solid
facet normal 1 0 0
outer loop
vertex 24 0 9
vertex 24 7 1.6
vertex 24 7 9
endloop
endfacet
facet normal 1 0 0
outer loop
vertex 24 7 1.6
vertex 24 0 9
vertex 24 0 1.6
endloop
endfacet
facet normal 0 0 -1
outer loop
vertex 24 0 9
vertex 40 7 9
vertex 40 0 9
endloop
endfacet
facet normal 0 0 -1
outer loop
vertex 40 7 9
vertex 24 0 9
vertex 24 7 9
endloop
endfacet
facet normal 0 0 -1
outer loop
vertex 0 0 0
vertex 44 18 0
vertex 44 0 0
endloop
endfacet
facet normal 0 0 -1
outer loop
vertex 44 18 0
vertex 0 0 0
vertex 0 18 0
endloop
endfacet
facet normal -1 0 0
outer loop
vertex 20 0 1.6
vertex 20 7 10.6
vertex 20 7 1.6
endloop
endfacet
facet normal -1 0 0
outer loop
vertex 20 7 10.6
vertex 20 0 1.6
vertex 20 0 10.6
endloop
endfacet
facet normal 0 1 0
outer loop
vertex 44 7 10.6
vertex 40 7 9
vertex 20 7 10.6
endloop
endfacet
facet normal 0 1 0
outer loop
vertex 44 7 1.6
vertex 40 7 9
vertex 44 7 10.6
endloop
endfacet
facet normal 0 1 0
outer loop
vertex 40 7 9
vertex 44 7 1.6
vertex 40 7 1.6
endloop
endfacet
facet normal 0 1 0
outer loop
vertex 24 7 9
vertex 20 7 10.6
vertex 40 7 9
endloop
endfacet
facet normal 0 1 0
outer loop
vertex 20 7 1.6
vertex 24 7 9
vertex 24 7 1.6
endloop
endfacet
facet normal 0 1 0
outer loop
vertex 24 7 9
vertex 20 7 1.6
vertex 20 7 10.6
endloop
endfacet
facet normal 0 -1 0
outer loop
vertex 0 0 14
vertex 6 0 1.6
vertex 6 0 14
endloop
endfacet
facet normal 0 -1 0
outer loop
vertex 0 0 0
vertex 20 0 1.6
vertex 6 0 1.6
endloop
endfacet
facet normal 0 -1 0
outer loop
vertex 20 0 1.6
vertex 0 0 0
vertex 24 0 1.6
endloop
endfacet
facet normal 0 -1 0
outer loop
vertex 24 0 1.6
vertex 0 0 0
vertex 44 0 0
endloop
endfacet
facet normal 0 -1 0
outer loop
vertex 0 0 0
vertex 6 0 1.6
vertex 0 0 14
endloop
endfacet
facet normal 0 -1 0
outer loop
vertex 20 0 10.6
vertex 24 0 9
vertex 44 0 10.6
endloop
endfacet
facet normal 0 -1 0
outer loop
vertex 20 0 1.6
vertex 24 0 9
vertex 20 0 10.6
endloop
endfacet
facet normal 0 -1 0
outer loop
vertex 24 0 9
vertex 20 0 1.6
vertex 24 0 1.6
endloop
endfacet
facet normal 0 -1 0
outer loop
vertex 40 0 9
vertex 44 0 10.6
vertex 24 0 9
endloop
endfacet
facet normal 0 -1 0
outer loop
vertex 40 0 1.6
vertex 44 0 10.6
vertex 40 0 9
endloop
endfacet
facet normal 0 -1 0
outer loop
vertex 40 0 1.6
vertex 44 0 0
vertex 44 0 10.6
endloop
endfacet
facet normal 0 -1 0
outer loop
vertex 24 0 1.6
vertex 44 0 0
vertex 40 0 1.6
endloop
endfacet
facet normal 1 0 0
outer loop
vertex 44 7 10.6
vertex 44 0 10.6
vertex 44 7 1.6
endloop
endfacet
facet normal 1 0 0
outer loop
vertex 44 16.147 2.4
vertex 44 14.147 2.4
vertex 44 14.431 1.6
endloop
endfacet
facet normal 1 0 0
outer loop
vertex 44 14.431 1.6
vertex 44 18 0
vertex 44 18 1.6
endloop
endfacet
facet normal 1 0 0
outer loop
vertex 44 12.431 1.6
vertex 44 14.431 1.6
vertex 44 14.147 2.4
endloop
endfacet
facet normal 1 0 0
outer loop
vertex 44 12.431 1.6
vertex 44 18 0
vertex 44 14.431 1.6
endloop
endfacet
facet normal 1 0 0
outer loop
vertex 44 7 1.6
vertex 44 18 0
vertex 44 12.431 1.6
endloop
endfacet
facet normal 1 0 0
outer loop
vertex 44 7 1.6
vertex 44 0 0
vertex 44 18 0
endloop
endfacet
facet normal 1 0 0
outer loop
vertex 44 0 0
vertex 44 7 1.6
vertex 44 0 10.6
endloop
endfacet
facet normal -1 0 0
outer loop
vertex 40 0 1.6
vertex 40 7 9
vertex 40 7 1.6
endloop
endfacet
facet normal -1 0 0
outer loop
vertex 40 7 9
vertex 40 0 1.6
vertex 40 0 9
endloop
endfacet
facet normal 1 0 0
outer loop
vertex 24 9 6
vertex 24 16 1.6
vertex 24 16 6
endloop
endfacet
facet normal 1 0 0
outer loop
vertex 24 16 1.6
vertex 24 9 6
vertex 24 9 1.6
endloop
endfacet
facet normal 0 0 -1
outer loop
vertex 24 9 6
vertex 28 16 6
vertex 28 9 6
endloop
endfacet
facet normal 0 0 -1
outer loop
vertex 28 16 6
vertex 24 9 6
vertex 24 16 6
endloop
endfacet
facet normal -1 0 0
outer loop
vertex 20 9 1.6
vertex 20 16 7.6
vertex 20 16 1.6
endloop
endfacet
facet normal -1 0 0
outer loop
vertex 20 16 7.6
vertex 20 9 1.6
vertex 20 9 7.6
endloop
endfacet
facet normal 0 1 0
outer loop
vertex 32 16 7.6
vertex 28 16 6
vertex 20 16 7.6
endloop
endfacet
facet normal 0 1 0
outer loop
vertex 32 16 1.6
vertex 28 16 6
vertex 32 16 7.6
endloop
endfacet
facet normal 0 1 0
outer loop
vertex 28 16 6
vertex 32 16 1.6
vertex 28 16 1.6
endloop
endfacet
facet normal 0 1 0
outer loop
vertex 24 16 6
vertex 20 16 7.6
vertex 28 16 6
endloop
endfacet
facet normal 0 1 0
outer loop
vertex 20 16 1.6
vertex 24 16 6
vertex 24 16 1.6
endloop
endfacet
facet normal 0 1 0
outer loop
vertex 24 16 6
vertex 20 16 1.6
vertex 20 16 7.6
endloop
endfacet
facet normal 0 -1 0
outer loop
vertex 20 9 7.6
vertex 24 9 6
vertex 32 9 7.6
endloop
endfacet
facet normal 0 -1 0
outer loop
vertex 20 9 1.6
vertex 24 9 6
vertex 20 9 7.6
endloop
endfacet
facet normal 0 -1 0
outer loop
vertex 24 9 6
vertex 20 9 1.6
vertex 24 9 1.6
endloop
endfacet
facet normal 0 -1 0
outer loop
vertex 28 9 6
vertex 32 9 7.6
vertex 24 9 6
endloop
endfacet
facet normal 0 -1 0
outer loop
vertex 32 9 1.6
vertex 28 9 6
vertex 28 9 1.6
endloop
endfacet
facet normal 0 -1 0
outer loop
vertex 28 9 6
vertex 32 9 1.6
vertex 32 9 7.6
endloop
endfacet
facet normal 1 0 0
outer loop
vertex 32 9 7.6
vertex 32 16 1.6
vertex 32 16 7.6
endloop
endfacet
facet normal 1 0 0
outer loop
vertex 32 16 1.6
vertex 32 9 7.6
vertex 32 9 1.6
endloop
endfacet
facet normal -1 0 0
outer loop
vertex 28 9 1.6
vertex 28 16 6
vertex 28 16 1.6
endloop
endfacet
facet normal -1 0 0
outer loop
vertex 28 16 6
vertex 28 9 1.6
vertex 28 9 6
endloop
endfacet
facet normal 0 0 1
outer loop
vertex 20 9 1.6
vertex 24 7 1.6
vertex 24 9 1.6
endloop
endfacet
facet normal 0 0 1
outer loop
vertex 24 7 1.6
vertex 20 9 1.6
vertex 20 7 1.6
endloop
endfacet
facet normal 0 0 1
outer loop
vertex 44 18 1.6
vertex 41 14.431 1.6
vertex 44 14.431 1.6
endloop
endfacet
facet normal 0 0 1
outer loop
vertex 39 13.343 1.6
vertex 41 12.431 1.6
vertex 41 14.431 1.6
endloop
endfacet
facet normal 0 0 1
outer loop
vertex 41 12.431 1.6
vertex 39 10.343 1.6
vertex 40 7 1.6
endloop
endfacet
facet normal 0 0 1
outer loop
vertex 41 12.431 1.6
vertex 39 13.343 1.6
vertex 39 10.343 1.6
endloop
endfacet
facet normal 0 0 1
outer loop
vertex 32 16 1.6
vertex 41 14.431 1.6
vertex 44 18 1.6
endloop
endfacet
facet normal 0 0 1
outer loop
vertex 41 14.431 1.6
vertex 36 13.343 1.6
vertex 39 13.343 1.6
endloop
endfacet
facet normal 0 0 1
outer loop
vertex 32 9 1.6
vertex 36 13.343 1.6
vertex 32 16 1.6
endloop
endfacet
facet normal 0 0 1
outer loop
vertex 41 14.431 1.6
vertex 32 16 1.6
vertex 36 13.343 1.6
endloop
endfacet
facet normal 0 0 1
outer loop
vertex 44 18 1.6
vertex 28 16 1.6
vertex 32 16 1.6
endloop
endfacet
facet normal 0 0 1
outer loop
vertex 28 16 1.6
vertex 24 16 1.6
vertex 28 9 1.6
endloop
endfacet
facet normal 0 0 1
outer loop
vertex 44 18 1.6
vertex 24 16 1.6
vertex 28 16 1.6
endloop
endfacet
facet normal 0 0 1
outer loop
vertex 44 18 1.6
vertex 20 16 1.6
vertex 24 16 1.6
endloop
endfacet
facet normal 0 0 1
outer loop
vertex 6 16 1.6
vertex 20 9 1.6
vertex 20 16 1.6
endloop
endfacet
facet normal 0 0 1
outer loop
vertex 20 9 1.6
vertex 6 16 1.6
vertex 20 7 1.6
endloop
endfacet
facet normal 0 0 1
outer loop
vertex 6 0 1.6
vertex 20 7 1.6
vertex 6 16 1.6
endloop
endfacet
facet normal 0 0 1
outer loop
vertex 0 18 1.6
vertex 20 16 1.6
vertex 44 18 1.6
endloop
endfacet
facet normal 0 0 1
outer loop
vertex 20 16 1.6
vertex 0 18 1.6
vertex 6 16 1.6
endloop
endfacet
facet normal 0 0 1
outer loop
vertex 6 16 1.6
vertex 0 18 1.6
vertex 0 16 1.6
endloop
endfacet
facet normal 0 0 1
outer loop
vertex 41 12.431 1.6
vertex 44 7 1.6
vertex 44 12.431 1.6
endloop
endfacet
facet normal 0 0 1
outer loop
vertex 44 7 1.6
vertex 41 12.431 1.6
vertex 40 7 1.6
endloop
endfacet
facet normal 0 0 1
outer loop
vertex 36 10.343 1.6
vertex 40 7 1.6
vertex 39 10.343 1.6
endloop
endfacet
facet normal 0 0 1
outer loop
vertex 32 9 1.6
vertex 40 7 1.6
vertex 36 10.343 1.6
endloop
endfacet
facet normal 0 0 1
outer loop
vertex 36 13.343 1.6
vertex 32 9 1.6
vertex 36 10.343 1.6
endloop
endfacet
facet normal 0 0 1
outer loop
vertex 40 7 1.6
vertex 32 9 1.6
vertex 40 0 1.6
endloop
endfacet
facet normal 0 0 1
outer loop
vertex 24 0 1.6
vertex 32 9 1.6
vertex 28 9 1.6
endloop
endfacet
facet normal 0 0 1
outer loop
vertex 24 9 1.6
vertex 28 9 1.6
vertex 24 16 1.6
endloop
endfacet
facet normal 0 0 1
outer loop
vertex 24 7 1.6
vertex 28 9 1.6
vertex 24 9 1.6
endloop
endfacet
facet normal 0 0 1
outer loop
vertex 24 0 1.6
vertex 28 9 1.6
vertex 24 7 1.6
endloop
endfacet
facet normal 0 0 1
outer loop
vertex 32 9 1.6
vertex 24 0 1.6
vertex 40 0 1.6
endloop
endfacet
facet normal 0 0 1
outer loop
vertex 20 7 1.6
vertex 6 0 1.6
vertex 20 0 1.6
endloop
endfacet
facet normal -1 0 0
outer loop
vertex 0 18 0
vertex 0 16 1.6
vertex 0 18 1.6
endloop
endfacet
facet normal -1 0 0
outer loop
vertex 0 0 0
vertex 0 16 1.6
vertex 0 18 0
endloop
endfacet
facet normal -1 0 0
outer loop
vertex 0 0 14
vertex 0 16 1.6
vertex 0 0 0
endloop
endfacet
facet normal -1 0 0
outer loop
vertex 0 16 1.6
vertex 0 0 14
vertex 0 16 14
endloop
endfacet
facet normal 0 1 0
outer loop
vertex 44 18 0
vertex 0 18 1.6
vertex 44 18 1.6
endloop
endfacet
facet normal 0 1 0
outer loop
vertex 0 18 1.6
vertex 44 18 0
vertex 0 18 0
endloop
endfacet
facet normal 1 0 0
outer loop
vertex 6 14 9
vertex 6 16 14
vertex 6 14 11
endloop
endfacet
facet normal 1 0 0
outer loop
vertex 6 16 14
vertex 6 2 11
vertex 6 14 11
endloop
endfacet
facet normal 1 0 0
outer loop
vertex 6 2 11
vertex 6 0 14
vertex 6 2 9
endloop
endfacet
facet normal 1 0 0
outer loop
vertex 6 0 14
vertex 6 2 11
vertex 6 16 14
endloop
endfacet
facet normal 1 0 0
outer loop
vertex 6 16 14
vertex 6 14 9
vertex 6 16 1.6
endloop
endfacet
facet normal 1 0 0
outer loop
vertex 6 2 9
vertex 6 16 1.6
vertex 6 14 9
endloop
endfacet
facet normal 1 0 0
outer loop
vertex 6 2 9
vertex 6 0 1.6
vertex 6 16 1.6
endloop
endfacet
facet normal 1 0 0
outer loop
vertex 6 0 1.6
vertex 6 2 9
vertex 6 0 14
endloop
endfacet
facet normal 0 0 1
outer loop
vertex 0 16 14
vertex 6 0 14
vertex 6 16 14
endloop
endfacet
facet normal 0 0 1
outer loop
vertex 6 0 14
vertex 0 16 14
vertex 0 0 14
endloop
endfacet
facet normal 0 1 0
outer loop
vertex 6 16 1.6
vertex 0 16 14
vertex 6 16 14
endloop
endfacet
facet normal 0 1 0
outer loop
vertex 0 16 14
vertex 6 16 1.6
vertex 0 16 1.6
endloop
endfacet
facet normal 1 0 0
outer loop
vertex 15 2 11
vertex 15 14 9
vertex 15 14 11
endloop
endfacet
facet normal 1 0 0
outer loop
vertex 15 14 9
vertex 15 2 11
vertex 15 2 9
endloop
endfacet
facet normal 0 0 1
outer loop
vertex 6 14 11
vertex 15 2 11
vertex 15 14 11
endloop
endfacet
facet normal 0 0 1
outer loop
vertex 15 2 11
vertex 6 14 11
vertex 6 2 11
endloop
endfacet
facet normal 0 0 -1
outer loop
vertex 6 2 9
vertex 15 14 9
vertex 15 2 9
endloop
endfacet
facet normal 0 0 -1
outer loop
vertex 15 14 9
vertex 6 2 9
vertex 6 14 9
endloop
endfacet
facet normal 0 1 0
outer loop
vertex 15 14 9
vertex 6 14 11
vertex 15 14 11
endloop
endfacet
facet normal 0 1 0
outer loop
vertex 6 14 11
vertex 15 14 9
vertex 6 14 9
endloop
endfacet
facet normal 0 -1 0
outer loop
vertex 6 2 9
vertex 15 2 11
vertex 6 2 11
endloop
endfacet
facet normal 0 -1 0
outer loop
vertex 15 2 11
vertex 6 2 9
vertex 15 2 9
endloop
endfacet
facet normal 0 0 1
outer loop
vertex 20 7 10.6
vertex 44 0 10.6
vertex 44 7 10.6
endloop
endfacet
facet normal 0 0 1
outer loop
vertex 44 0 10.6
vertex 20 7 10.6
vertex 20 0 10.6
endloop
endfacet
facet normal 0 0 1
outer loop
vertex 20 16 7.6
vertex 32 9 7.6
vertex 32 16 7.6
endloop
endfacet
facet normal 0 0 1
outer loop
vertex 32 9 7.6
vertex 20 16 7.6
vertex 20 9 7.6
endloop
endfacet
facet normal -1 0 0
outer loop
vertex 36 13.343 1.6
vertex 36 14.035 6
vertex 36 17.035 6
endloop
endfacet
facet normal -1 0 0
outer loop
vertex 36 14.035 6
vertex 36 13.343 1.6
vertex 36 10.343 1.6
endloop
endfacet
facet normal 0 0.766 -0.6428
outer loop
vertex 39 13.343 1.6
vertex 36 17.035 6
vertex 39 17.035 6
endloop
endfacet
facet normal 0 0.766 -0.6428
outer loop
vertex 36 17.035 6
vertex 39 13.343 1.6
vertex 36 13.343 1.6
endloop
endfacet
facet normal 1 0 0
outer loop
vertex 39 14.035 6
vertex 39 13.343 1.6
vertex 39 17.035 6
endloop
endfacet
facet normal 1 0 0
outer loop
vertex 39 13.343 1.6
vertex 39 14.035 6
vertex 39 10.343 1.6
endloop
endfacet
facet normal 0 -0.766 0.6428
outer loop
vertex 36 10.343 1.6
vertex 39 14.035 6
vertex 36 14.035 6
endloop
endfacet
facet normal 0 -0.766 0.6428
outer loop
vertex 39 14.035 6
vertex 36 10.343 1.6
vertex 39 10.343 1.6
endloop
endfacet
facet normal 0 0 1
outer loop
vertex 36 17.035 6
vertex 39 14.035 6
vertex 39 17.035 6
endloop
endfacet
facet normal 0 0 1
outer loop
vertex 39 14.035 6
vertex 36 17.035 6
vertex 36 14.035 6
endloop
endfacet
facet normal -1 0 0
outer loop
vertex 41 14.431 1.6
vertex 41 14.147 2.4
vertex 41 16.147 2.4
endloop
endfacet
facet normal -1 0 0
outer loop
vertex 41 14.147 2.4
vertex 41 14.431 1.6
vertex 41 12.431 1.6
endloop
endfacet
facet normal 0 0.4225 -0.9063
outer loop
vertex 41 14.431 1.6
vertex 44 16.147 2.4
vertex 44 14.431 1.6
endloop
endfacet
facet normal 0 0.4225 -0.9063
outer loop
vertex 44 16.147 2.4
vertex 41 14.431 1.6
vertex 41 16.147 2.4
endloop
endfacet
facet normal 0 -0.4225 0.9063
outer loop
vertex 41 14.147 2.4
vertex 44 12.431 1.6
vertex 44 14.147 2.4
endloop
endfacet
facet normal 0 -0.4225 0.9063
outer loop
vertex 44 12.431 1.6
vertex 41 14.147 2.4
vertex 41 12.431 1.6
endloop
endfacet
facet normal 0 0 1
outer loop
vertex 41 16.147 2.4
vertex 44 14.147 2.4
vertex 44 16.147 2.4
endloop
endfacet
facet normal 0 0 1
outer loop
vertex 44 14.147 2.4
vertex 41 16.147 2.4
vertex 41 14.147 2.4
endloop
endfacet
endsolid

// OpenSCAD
// A small part with one of everything the inspector looks for. Sliced without supports it has a hanging
// ledge, a long bridge and a steep wall; a short bridge and a 40 degree wall are fine.
$fn = 48;
cube([44, 18, 1.6]);                                   // base
translate([0, 0, 0]) cube([6, 16, 14]);                // tower
translate([6, 2, 9]) cube([9, 12, 2]);                 // ledge: hangs, held on one side only
// long bridge between two posts, 16 mm span
for (x = [20, 40]) translate([x, 0, 0]) cube([4, 7, 9]);
translate([20, 0, 9]) cube([24, 7, 1.6]);
// short bridge, 4 mm span
for (x = [20, 28]) translate([x, 9, 0]) cube([4, 7, 6]);
translate([20, 9, 6]) cube([12, 7, 1.6]);
// walls leaning out: 40 degrees from vertical (fine) and 65 degrees (steep)
translate([36, 9, 0]) rotate([90, 0, 90]) linear_extrude(3) polygon([[0, 0], [3, 0], [3 + 6 * tan(40), 6], [6 * tan(40), 6]]);
translate([41, 9, 0]) rotate([90, 0, 90]) linear_extrude(3) polygon([[0, 0], [2, 0], [2 + 2.4 * tan(65), 2.4], [2.4 * tan(65), 2.4]]);
